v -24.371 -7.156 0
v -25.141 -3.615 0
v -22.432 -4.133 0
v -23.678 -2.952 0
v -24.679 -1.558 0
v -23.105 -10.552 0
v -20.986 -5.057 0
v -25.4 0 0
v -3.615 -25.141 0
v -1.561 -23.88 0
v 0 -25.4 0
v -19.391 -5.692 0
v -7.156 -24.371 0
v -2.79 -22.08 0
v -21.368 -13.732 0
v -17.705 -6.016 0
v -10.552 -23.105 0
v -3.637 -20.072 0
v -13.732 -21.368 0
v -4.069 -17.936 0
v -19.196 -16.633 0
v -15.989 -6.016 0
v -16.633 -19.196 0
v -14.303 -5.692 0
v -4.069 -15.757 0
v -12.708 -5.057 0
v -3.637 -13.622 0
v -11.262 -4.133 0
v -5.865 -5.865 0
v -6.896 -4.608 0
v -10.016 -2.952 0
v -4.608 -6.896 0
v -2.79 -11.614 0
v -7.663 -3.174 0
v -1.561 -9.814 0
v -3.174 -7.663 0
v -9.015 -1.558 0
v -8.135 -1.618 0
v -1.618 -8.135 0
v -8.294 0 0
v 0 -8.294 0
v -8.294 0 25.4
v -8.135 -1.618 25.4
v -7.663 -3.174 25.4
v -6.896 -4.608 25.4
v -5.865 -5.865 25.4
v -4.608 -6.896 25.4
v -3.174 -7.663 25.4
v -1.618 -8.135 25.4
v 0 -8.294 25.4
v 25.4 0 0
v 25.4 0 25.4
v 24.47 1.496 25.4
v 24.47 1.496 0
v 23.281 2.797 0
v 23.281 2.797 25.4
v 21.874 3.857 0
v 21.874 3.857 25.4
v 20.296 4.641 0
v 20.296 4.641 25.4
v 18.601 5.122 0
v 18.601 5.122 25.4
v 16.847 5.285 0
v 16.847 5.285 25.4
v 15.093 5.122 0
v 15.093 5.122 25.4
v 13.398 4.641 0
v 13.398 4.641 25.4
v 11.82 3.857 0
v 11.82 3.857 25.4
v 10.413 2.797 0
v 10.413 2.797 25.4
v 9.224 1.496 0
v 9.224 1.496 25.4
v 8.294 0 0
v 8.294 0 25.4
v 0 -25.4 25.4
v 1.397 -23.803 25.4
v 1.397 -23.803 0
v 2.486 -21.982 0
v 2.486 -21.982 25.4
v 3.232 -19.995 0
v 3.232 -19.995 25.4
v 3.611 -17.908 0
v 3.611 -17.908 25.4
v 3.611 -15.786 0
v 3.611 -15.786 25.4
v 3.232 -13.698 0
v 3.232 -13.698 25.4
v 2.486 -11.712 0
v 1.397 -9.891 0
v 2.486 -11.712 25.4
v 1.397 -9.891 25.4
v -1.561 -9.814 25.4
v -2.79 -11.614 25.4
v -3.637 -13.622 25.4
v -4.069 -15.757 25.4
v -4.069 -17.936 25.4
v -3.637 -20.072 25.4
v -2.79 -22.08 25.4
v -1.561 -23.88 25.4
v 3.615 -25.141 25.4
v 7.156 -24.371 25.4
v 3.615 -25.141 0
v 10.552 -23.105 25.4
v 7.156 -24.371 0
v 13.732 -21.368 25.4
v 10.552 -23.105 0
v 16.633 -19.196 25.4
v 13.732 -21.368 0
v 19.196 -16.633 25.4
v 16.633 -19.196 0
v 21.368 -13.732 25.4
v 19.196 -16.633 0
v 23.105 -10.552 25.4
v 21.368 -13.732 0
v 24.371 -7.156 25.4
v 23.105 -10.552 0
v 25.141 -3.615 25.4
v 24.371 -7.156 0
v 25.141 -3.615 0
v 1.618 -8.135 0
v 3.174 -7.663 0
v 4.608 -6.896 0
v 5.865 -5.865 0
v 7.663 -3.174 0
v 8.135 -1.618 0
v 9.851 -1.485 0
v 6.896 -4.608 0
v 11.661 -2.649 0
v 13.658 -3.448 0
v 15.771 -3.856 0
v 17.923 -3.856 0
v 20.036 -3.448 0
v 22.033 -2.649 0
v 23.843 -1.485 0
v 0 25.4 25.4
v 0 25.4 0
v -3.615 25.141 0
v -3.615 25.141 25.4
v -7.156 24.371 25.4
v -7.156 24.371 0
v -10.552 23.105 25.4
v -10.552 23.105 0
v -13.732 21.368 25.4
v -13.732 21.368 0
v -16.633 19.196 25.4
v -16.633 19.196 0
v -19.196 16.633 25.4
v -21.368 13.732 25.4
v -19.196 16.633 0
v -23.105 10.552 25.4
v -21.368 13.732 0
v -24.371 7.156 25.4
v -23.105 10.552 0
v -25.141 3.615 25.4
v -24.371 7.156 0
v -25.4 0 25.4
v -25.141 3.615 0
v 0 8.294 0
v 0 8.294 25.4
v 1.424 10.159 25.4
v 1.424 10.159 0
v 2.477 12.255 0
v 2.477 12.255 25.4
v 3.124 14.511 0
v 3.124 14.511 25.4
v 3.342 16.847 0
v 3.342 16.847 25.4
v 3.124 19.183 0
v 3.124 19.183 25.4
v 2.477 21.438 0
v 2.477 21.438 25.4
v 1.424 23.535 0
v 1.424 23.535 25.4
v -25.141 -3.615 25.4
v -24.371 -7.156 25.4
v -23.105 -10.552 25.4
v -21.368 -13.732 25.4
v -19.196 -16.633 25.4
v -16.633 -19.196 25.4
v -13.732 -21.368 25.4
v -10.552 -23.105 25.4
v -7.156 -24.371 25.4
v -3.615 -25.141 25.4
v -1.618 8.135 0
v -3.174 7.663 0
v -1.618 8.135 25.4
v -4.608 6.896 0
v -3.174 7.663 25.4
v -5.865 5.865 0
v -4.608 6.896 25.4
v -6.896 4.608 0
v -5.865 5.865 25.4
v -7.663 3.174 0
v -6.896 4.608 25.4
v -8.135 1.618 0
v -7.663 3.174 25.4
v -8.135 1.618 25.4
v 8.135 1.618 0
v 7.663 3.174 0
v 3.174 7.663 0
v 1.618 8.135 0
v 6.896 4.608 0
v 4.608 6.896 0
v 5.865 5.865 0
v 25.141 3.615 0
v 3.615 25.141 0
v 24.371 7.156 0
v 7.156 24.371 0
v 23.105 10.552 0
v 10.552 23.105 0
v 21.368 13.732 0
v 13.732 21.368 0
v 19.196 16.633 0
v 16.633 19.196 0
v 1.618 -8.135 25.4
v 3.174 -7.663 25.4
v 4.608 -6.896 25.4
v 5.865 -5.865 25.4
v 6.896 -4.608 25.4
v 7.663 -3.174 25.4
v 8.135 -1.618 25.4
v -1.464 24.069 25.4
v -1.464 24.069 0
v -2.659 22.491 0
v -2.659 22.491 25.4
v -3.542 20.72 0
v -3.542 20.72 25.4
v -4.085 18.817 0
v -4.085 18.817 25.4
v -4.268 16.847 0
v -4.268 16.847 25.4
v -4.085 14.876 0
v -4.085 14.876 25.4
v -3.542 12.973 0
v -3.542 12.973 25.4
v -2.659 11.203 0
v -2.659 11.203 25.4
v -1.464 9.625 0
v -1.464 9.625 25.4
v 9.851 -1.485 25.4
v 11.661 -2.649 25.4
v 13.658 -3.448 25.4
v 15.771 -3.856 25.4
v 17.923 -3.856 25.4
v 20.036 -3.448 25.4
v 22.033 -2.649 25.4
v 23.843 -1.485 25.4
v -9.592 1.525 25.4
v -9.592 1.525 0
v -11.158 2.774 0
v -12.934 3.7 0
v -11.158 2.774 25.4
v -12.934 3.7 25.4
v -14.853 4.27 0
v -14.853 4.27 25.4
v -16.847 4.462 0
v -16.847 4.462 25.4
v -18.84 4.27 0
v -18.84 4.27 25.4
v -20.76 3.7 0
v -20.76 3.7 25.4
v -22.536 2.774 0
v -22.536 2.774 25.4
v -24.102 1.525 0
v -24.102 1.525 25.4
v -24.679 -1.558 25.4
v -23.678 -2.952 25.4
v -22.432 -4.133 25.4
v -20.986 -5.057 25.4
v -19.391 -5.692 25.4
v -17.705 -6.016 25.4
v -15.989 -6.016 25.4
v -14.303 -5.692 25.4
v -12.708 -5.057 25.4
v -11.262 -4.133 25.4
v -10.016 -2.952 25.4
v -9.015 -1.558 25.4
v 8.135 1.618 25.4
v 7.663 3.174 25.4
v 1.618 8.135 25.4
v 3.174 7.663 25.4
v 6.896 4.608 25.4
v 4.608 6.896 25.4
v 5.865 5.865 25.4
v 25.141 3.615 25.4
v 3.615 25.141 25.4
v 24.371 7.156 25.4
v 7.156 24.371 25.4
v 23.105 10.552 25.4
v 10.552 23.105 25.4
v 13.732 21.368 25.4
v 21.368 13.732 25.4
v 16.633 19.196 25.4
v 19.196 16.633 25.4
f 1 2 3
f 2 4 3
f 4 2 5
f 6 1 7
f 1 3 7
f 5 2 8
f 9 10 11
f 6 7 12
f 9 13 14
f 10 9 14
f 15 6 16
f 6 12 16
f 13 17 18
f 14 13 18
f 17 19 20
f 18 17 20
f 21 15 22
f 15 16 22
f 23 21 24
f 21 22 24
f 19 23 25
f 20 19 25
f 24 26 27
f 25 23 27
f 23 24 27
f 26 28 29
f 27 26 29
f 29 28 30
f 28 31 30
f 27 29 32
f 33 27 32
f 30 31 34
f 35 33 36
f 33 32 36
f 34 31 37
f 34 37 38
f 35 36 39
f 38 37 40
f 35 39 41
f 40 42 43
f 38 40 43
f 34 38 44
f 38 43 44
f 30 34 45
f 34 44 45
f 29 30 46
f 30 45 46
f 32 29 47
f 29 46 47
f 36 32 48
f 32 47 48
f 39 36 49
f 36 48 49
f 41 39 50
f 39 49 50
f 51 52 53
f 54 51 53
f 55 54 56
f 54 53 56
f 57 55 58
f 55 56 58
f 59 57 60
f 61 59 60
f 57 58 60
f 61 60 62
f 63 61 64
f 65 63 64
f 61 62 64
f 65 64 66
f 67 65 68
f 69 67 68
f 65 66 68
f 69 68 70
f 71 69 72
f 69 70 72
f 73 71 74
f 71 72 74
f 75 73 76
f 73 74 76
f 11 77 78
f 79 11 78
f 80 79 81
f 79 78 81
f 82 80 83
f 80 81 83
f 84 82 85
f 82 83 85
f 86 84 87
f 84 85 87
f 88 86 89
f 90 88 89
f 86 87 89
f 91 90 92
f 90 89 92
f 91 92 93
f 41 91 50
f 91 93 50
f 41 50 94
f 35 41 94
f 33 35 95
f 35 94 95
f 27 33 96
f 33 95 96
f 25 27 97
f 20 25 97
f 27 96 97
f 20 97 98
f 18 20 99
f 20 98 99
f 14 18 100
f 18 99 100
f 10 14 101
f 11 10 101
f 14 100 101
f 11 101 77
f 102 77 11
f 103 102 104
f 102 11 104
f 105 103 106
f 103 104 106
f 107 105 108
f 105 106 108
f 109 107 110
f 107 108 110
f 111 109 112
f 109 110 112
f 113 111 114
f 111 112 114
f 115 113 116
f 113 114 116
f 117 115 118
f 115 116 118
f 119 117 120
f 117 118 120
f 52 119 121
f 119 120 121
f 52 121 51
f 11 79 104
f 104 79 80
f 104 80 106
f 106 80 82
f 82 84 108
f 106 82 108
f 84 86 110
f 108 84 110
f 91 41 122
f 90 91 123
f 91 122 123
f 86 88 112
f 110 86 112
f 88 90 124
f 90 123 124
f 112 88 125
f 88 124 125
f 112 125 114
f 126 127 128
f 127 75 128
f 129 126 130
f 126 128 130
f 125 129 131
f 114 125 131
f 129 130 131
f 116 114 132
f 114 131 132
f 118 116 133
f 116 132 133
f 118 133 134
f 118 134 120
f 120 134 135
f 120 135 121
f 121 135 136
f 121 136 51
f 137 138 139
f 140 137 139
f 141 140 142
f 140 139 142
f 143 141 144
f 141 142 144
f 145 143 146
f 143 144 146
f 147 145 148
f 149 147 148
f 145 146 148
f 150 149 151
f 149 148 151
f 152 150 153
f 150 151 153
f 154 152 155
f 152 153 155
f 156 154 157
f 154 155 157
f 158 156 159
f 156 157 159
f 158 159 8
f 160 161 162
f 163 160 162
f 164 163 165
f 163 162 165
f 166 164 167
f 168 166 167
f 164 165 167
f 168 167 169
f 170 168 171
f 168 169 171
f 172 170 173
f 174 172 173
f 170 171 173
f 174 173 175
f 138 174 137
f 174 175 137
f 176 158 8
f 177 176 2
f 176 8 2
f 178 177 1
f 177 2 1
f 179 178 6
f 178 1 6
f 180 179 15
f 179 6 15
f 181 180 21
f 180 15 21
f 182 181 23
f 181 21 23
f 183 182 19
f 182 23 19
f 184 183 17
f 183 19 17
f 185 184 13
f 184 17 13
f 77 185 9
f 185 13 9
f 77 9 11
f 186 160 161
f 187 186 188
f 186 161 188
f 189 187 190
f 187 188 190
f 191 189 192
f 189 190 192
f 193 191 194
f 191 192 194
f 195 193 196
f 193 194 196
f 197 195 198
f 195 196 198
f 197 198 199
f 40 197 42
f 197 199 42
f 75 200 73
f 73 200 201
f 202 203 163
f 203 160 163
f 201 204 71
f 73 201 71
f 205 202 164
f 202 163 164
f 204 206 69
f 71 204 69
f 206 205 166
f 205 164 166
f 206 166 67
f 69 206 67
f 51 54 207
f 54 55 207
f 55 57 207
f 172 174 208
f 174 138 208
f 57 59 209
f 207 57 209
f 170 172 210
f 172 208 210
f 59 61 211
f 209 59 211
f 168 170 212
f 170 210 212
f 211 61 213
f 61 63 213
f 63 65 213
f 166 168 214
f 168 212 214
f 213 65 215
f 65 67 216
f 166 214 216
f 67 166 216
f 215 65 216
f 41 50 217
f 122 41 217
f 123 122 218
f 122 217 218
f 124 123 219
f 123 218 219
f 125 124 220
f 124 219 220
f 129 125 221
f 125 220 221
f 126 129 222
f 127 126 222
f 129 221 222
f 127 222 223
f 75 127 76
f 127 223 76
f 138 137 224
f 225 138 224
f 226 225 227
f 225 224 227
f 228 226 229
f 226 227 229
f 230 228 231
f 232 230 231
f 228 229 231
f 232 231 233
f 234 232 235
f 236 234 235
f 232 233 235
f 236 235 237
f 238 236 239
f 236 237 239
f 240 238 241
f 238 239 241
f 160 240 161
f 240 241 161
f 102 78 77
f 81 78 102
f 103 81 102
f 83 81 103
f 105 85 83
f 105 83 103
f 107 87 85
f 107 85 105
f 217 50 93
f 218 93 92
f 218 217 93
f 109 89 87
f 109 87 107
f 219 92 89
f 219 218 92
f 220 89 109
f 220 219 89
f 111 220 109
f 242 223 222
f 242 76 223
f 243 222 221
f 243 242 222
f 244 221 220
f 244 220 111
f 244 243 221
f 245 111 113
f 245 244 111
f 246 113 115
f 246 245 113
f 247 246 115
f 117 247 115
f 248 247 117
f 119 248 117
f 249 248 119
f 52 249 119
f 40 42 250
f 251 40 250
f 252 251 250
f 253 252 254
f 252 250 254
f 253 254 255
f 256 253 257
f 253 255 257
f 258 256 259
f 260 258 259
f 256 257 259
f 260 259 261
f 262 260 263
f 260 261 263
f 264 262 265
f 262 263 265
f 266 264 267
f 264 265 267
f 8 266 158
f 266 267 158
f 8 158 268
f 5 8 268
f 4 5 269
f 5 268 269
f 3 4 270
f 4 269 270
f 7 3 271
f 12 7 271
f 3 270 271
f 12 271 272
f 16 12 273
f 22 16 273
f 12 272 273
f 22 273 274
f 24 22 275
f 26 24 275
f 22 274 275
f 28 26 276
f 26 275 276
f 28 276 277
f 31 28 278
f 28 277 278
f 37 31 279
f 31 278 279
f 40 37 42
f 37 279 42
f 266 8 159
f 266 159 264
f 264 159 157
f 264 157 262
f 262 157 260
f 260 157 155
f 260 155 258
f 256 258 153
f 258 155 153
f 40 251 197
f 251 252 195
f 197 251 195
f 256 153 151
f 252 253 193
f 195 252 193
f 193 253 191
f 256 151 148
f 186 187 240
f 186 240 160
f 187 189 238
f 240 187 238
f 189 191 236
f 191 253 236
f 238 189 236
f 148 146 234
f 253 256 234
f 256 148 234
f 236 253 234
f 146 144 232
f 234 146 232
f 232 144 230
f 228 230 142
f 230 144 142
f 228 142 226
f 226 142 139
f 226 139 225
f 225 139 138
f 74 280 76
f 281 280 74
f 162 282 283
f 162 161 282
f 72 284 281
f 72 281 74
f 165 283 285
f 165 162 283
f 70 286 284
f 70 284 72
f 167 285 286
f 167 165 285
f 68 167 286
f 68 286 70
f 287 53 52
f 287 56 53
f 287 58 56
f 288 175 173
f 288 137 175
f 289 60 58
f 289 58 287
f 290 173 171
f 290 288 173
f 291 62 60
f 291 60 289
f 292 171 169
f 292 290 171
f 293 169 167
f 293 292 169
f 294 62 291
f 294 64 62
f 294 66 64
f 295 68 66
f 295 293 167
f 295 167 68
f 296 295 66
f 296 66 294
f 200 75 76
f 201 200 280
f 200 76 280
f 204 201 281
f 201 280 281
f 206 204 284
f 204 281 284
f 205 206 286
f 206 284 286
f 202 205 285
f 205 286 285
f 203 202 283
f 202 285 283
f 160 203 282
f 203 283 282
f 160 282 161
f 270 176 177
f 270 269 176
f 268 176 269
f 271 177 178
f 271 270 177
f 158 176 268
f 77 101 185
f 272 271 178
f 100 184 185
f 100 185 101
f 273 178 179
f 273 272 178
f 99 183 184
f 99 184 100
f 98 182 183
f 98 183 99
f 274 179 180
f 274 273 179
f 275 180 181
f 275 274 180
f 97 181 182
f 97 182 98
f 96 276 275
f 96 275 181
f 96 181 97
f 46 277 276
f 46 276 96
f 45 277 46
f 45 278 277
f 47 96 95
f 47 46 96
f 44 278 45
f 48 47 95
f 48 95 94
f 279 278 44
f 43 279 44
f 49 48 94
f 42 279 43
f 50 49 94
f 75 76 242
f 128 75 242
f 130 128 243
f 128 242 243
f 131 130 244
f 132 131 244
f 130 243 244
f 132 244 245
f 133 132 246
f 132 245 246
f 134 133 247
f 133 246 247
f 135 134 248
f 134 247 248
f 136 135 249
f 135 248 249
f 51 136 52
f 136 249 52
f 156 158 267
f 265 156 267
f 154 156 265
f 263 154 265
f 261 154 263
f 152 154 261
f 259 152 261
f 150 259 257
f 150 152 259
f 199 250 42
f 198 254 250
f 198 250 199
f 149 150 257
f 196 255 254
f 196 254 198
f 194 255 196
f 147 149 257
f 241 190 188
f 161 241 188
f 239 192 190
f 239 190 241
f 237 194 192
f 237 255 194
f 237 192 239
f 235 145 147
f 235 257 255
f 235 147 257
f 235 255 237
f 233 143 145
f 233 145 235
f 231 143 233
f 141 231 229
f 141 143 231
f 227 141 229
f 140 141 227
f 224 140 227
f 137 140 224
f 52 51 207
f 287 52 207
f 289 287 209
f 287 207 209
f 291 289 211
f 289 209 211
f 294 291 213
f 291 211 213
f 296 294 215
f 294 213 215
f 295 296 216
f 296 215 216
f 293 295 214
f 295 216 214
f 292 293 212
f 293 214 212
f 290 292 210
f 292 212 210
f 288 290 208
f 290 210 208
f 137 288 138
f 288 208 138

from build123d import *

# Parameters (mm, degrees)
F0_R     = 25.4
F1_DEPTH = 25.4
F2_R     = 8.293867
F3_DEPTH = 25.401
F5_DEPTH = 25.401


with BuildPart() as f1:
    # F0 (on Top) → F1 (new body)
    with BuildSketch(Plane.XY):
        Circle(F0_R)
    extrude(amount=F1_DEPTH)

    # F2 (on face) → F3 (cut, through all)
    with BuildSketch(Plane.XY.offset(25.4)):
        Circle(F2_R)
    extrude(amount=-F3_DEPTH, mode=Mode.SUBTRACT)

    # F4 (on face) → F5 (cut, through all)
    with BuildSketch(Plane.XY.offset(25.4)):
        with BuildLine():
            ThreePointArc((0, 8.293867), (3.342263, 16.846933), (0, 25.4))
            ThreePointArc((0, 25.4), (-4.2678, 16.846933), (0, 8.293867))
        make_face()
        with BuildLine():
            ThreePointArc((8.293867, 0), (16.846933, -3.90691), (25.4, 0))
            ThreePointArc((25.4, 0), (16.846933, 5.284725), (8.293867, 0))
        make_face()
        with BuildLine():
            ThreePointArc((-8.293867, 0), (-16.846933, 4.462035), (-25.4, 0))
            ThreePointArc((-25.4, 0), (-16.846933, -6.056643), (-8.293867, 0))
        make_face()
        with BuildLine():
            ThreePointArc((0, -8.293867), (-4.123797, -16.846933), (0, -25.4))
            ThreePointArc((0, -25.4), (3.658497, -16.846933), (0, -8.293867))
        make_face()
    extrude(amount=-F5_DEPTH, mode=Mode.SUBTRACT)


solid = f1.part
